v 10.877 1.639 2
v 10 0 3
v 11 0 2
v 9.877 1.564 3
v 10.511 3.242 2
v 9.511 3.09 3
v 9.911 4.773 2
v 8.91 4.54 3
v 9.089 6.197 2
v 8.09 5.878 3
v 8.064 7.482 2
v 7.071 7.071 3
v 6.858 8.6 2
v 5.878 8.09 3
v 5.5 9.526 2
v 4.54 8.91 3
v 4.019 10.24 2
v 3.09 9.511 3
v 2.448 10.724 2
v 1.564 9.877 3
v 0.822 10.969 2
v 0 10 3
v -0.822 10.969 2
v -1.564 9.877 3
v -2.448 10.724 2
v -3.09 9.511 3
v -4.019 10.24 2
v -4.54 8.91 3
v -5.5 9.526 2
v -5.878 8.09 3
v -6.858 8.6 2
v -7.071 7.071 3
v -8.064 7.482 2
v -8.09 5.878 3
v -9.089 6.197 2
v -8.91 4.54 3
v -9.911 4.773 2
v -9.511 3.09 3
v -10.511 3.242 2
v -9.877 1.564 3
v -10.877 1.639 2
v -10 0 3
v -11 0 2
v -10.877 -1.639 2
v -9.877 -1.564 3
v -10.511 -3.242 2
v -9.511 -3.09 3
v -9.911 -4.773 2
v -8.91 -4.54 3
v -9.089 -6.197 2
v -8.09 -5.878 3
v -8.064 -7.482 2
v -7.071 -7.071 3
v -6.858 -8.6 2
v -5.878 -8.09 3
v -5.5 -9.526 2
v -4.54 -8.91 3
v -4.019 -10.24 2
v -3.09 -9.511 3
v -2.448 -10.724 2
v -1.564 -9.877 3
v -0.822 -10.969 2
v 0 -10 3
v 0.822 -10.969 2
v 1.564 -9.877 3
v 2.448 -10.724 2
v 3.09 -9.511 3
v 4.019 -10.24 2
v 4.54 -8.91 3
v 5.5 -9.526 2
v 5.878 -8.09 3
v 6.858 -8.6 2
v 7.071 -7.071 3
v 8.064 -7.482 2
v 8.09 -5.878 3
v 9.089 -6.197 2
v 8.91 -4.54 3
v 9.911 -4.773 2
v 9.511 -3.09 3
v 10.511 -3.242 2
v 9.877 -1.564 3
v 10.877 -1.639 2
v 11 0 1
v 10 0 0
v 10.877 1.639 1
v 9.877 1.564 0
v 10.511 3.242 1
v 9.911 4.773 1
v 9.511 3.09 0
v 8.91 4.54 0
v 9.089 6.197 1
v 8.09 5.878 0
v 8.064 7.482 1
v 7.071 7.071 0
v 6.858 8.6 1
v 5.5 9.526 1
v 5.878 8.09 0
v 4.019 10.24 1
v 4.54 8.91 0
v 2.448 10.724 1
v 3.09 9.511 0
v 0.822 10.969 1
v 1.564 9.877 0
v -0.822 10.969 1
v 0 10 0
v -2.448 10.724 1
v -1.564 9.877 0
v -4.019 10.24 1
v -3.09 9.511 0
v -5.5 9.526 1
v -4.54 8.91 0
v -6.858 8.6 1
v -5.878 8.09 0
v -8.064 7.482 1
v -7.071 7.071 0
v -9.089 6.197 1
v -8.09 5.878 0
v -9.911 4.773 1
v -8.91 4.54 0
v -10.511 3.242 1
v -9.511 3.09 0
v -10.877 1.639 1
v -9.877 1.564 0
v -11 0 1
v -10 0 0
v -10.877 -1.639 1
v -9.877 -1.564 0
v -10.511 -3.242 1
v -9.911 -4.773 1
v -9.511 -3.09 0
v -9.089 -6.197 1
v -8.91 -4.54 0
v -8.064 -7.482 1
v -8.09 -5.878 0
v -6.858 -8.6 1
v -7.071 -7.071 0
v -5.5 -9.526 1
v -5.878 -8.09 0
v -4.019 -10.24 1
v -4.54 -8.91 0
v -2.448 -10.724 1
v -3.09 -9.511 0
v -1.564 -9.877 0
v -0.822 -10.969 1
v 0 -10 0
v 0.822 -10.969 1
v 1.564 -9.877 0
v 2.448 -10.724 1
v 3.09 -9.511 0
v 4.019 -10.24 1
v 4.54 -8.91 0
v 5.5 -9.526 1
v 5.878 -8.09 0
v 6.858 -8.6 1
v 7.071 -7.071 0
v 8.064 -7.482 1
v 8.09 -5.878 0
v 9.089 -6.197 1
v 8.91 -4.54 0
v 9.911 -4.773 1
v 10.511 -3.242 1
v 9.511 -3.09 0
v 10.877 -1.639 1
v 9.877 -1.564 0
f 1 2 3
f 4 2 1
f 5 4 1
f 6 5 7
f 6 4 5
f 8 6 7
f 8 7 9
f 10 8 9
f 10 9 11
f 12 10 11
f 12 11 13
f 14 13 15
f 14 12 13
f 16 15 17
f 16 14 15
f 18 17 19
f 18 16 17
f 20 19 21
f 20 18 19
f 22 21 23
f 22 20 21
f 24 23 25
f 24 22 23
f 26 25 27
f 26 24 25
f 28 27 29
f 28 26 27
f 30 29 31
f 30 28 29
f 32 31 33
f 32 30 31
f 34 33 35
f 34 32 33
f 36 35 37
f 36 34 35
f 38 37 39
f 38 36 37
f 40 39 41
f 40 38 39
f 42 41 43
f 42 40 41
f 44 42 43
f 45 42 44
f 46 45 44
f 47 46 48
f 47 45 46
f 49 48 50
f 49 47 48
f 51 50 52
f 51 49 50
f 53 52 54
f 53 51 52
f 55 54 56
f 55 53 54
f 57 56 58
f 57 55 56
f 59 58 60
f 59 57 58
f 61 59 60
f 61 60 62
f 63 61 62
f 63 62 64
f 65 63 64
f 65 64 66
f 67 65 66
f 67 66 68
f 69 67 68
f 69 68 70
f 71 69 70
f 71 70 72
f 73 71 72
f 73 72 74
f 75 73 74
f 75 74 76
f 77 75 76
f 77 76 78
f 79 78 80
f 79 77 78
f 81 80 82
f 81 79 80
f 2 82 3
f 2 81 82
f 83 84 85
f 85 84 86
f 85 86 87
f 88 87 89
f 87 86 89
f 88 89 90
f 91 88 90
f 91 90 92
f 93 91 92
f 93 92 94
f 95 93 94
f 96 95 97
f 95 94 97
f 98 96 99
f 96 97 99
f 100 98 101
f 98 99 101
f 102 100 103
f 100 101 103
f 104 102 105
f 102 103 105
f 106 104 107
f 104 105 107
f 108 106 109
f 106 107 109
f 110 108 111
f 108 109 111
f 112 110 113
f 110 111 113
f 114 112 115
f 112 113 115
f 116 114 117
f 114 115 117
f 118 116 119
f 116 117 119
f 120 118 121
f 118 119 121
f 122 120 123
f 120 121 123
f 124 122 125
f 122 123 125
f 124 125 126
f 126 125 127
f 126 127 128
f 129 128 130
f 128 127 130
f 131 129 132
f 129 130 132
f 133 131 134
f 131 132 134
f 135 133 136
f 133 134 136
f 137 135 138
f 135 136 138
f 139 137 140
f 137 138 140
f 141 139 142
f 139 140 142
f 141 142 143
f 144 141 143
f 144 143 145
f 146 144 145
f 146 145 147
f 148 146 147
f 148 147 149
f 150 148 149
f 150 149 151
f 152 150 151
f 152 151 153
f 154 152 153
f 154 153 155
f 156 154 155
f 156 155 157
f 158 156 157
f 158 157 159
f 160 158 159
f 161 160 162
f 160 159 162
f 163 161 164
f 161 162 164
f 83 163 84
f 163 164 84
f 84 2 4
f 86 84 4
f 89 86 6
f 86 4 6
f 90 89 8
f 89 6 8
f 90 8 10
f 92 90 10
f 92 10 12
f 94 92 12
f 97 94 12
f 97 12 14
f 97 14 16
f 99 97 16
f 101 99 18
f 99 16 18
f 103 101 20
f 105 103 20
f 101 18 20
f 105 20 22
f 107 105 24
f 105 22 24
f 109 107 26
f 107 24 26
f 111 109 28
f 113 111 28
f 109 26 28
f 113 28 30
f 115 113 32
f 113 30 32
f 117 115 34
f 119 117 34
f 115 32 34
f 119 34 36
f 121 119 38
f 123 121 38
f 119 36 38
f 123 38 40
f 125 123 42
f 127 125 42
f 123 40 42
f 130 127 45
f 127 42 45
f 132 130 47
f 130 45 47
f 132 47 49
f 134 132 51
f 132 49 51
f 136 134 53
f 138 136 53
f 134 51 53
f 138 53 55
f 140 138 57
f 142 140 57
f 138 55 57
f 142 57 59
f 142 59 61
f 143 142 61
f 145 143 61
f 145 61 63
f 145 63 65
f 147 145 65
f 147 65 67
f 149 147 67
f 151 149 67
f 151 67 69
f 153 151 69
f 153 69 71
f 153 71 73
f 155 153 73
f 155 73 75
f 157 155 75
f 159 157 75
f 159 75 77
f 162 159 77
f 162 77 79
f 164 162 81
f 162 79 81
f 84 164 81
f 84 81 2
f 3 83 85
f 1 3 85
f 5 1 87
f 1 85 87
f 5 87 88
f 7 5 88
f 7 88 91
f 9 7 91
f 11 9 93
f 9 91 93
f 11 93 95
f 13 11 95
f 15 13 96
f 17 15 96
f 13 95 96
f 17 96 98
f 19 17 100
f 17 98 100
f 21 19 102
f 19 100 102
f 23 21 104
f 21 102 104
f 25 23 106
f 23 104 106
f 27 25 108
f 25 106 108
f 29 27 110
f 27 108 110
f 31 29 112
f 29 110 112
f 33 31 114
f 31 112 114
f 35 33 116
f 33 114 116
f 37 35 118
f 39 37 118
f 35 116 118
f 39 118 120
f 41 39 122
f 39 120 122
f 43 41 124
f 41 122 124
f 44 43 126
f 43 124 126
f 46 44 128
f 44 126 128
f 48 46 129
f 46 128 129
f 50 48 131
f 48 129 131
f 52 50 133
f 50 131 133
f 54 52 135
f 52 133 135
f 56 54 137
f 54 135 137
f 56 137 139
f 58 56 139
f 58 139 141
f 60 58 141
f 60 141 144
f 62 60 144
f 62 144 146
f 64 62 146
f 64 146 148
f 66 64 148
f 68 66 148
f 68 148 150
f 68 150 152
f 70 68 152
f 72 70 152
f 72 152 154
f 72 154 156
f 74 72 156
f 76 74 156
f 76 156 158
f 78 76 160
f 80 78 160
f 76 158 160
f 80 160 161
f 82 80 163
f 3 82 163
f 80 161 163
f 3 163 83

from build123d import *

# Parameters (mm, degrees)
F0_R     = 11
F1_DEPTH = 3
F2_R     = 10
F3_DEPTH = 3
F4_SIZE  = 0.99999


# Not quite as in the source:
# - a fillet or chamfer is up to 0.001 mm smaller than in the source, because OpenCascade refuses the exact size


with BuildPart() as f1:
    # F0 (on Top) → F1 (new body)
    with BuildSketch(Plane.XY):
        Circle(F0_R)
    extrude(amount=F1_DEPTH)

    # F2 (on face) → F3 (cut)
    with BuildSketch(Plane.XY.offset(3)):
        Circle(F2_R)
    extrude(amount=-F3_DEPTH, mode=Mode.SUBTRACT)

    # F4 (size 1 in the source; OpenCascade refuses exactly that, so slightly less here)
    f4_edges = [f1.edges().sort_by_distance(p)[0] for p in [
        (-11, 0, 3),
        (-11, 0, 0),
    ]]
    chamfer(f4_edges, length=F4_SIZE)


solid = f1.part
